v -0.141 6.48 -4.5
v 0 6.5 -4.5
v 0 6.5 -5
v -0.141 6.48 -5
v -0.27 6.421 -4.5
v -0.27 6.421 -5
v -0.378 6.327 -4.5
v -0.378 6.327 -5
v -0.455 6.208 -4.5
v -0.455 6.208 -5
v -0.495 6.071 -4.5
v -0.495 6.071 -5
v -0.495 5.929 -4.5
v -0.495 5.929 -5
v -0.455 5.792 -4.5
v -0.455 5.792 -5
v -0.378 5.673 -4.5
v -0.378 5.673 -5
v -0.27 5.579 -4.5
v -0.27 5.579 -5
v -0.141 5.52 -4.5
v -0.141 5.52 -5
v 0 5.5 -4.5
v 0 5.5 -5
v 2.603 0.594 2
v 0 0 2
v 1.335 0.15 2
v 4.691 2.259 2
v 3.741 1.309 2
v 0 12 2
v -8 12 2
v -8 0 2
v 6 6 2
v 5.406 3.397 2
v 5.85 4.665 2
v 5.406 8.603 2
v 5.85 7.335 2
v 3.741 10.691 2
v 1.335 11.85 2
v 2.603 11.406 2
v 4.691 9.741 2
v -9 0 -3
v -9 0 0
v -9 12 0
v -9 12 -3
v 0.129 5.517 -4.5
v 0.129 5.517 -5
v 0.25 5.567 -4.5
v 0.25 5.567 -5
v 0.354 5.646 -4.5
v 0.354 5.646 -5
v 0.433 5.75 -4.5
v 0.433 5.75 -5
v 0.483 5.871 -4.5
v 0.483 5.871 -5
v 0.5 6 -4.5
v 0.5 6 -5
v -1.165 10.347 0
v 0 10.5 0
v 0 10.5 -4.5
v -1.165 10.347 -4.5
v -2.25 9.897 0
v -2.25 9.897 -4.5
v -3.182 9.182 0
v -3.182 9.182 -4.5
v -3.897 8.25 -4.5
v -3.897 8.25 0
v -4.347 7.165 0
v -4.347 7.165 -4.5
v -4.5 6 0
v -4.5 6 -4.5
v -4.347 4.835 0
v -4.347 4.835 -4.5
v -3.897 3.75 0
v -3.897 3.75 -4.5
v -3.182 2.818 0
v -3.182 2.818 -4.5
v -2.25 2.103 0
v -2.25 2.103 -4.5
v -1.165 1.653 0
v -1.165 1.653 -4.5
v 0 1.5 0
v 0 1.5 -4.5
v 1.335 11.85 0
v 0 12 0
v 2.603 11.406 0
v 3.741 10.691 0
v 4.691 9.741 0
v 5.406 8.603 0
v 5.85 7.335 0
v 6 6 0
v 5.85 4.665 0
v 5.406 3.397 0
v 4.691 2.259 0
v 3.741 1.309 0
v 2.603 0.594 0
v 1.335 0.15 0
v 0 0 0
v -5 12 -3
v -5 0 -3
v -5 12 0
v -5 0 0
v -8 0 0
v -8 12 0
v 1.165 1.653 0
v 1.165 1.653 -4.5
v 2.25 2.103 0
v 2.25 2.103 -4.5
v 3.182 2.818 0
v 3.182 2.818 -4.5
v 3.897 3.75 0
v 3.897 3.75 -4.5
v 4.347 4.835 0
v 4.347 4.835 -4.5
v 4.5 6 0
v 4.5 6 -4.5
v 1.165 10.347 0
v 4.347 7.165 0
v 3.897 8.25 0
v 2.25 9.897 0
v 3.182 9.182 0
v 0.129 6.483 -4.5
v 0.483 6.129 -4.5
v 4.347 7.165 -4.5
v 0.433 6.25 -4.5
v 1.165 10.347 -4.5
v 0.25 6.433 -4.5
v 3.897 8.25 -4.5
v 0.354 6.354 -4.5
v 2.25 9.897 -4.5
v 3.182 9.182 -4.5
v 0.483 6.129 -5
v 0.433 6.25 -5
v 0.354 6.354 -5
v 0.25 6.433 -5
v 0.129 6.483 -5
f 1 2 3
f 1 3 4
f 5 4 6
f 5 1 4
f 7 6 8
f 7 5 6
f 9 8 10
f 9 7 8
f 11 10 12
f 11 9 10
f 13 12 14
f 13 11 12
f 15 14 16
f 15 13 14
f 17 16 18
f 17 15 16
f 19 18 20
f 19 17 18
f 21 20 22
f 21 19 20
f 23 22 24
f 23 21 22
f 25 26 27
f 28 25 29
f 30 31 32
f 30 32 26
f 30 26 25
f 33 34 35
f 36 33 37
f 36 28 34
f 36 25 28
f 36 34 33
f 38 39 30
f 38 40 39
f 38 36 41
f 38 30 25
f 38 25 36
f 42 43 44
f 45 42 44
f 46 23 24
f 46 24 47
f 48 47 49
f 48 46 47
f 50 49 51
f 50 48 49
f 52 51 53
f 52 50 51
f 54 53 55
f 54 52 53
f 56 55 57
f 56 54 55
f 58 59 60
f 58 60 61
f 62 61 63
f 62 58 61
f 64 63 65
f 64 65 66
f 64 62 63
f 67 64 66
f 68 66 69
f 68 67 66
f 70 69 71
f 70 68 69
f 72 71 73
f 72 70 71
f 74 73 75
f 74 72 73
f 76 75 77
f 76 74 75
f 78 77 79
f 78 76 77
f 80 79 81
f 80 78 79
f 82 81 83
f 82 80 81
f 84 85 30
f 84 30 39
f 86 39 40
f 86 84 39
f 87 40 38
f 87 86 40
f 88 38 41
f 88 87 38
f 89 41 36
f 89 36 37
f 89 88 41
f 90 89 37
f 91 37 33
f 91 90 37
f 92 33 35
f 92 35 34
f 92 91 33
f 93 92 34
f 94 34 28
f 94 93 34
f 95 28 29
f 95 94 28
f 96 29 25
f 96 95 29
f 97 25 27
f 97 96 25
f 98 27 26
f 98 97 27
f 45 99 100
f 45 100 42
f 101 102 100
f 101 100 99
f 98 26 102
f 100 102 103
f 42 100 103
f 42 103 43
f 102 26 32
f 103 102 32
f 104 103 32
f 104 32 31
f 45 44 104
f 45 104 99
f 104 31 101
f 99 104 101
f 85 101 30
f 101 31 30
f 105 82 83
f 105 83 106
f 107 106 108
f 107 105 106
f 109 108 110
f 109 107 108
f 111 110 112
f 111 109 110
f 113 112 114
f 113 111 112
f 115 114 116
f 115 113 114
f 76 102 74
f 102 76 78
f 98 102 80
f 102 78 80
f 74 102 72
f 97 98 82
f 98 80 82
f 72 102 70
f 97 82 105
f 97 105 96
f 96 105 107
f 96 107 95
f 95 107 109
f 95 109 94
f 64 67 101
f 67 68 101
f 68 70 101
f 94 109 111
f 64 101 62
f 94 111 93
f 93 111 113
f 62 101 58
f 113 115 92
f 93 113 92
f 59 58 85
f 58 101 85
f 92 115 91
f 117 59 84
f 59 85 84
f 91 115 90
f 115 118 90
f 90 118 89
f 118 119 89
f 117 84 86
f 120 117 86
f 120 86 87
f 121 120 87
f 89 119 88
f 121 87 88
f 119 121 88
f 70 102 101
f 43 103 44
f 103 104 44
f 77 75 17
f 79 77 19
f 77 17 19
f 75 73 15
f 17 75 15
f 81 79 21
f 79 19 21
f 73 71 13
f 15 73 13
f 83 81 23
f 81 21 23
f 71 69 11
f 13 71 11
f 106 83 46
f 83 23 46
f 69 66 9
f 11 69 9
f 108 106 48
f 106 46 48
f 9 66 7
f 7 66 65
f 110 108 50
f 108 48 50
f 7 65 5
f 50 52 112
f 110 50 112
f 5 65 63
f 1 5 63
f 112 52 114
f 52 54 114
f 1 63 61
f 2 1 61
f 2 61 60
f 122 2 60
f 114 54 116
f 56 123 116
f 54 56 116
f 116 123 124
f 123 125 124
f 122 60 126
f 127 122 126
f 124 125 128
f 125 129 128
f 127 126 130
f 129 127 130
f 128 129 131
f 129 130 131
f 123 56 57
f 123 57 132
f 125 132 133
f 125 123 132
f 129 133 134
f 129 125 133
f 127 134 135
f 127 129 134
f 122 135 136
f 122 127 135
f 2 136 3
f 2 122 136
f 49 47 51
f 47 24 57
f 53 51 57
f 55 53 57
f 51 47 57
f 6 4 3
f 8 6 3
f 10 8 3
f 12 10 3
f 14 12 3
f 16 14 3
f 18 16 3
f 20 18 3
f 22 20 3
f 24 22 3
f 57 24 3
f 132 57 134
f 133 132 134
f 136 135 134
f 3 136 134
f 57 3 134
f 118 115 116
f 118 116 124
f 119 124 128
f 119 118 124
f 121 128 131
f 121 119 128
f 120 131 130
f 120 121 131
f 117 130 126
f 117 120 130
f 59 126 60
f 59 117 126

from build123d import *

# Parameters (mm, degrees)
BOSS_EXTRUDE1_DEPTH = 2
SKETCH1_3_R         = 4.5
BOSS_EXTRUDE2_DEPTH = 4.5
SKETCH1_4_R         = 0.5
BOSS_EXTRUDE3_DEPTH = 5
SKETCH3_W           = 4
SKETCH3_H           = 12
BOSS_EXTRUDE4_DEPTH = 3


with BuildPart() as part:
    # Sketch1 → Boss-Extrude1 (new body)
    with BuildSketch(Plane.XY):
        with BuildLine():
            Line((-8, 0), (0, 0))
            ThreePointArc((0, 0), (6, 6), (0, 12))
            Line((0, 12), (-8, 12))
            Line((-8, 12), (-8, 0))
        make_face()
    extrude(amount=BOSS_EXTRUDE1_DEPTH)



with BuildPart() as body_2:
    # Sketch1<3> → Boss-Extrude2 (new body)
    with BuildSketch(Plane.XY):
        with Locations((0, 6)):
            Circle(SKETCH1_3_R)
    extrude(amount=-BOSS_EXTRUDE2_DEPTH)


with BuildPart() as part_1:
    add(part.part)

    add(body_2.part)  # Boss-Extrude3 merges body 2
    # Sketch1<4> → Boss-Extrude3 (add)
    with BuildSketch(Plane.XY):
        with Locations((0, 6)):
            Circle(SKETCH1_4_R)
    extrude(amount=-BOSS_EXTRUDE3_DEPTH)

    # Sketch3 → Boss-Extrude4 (add)
    with BuildSketch(Plane(origin=(0, 0, 0), x_dir=(-1, 0, 0), z_dir=(0, 0, -1))):
        with Locations((7, 6)):
            Rectangle(SKETCH3_W, SKETCH3_H)
    extrude(amount=BOSS_EXTRUDE4_DEPTH)


solid = part_1.part
